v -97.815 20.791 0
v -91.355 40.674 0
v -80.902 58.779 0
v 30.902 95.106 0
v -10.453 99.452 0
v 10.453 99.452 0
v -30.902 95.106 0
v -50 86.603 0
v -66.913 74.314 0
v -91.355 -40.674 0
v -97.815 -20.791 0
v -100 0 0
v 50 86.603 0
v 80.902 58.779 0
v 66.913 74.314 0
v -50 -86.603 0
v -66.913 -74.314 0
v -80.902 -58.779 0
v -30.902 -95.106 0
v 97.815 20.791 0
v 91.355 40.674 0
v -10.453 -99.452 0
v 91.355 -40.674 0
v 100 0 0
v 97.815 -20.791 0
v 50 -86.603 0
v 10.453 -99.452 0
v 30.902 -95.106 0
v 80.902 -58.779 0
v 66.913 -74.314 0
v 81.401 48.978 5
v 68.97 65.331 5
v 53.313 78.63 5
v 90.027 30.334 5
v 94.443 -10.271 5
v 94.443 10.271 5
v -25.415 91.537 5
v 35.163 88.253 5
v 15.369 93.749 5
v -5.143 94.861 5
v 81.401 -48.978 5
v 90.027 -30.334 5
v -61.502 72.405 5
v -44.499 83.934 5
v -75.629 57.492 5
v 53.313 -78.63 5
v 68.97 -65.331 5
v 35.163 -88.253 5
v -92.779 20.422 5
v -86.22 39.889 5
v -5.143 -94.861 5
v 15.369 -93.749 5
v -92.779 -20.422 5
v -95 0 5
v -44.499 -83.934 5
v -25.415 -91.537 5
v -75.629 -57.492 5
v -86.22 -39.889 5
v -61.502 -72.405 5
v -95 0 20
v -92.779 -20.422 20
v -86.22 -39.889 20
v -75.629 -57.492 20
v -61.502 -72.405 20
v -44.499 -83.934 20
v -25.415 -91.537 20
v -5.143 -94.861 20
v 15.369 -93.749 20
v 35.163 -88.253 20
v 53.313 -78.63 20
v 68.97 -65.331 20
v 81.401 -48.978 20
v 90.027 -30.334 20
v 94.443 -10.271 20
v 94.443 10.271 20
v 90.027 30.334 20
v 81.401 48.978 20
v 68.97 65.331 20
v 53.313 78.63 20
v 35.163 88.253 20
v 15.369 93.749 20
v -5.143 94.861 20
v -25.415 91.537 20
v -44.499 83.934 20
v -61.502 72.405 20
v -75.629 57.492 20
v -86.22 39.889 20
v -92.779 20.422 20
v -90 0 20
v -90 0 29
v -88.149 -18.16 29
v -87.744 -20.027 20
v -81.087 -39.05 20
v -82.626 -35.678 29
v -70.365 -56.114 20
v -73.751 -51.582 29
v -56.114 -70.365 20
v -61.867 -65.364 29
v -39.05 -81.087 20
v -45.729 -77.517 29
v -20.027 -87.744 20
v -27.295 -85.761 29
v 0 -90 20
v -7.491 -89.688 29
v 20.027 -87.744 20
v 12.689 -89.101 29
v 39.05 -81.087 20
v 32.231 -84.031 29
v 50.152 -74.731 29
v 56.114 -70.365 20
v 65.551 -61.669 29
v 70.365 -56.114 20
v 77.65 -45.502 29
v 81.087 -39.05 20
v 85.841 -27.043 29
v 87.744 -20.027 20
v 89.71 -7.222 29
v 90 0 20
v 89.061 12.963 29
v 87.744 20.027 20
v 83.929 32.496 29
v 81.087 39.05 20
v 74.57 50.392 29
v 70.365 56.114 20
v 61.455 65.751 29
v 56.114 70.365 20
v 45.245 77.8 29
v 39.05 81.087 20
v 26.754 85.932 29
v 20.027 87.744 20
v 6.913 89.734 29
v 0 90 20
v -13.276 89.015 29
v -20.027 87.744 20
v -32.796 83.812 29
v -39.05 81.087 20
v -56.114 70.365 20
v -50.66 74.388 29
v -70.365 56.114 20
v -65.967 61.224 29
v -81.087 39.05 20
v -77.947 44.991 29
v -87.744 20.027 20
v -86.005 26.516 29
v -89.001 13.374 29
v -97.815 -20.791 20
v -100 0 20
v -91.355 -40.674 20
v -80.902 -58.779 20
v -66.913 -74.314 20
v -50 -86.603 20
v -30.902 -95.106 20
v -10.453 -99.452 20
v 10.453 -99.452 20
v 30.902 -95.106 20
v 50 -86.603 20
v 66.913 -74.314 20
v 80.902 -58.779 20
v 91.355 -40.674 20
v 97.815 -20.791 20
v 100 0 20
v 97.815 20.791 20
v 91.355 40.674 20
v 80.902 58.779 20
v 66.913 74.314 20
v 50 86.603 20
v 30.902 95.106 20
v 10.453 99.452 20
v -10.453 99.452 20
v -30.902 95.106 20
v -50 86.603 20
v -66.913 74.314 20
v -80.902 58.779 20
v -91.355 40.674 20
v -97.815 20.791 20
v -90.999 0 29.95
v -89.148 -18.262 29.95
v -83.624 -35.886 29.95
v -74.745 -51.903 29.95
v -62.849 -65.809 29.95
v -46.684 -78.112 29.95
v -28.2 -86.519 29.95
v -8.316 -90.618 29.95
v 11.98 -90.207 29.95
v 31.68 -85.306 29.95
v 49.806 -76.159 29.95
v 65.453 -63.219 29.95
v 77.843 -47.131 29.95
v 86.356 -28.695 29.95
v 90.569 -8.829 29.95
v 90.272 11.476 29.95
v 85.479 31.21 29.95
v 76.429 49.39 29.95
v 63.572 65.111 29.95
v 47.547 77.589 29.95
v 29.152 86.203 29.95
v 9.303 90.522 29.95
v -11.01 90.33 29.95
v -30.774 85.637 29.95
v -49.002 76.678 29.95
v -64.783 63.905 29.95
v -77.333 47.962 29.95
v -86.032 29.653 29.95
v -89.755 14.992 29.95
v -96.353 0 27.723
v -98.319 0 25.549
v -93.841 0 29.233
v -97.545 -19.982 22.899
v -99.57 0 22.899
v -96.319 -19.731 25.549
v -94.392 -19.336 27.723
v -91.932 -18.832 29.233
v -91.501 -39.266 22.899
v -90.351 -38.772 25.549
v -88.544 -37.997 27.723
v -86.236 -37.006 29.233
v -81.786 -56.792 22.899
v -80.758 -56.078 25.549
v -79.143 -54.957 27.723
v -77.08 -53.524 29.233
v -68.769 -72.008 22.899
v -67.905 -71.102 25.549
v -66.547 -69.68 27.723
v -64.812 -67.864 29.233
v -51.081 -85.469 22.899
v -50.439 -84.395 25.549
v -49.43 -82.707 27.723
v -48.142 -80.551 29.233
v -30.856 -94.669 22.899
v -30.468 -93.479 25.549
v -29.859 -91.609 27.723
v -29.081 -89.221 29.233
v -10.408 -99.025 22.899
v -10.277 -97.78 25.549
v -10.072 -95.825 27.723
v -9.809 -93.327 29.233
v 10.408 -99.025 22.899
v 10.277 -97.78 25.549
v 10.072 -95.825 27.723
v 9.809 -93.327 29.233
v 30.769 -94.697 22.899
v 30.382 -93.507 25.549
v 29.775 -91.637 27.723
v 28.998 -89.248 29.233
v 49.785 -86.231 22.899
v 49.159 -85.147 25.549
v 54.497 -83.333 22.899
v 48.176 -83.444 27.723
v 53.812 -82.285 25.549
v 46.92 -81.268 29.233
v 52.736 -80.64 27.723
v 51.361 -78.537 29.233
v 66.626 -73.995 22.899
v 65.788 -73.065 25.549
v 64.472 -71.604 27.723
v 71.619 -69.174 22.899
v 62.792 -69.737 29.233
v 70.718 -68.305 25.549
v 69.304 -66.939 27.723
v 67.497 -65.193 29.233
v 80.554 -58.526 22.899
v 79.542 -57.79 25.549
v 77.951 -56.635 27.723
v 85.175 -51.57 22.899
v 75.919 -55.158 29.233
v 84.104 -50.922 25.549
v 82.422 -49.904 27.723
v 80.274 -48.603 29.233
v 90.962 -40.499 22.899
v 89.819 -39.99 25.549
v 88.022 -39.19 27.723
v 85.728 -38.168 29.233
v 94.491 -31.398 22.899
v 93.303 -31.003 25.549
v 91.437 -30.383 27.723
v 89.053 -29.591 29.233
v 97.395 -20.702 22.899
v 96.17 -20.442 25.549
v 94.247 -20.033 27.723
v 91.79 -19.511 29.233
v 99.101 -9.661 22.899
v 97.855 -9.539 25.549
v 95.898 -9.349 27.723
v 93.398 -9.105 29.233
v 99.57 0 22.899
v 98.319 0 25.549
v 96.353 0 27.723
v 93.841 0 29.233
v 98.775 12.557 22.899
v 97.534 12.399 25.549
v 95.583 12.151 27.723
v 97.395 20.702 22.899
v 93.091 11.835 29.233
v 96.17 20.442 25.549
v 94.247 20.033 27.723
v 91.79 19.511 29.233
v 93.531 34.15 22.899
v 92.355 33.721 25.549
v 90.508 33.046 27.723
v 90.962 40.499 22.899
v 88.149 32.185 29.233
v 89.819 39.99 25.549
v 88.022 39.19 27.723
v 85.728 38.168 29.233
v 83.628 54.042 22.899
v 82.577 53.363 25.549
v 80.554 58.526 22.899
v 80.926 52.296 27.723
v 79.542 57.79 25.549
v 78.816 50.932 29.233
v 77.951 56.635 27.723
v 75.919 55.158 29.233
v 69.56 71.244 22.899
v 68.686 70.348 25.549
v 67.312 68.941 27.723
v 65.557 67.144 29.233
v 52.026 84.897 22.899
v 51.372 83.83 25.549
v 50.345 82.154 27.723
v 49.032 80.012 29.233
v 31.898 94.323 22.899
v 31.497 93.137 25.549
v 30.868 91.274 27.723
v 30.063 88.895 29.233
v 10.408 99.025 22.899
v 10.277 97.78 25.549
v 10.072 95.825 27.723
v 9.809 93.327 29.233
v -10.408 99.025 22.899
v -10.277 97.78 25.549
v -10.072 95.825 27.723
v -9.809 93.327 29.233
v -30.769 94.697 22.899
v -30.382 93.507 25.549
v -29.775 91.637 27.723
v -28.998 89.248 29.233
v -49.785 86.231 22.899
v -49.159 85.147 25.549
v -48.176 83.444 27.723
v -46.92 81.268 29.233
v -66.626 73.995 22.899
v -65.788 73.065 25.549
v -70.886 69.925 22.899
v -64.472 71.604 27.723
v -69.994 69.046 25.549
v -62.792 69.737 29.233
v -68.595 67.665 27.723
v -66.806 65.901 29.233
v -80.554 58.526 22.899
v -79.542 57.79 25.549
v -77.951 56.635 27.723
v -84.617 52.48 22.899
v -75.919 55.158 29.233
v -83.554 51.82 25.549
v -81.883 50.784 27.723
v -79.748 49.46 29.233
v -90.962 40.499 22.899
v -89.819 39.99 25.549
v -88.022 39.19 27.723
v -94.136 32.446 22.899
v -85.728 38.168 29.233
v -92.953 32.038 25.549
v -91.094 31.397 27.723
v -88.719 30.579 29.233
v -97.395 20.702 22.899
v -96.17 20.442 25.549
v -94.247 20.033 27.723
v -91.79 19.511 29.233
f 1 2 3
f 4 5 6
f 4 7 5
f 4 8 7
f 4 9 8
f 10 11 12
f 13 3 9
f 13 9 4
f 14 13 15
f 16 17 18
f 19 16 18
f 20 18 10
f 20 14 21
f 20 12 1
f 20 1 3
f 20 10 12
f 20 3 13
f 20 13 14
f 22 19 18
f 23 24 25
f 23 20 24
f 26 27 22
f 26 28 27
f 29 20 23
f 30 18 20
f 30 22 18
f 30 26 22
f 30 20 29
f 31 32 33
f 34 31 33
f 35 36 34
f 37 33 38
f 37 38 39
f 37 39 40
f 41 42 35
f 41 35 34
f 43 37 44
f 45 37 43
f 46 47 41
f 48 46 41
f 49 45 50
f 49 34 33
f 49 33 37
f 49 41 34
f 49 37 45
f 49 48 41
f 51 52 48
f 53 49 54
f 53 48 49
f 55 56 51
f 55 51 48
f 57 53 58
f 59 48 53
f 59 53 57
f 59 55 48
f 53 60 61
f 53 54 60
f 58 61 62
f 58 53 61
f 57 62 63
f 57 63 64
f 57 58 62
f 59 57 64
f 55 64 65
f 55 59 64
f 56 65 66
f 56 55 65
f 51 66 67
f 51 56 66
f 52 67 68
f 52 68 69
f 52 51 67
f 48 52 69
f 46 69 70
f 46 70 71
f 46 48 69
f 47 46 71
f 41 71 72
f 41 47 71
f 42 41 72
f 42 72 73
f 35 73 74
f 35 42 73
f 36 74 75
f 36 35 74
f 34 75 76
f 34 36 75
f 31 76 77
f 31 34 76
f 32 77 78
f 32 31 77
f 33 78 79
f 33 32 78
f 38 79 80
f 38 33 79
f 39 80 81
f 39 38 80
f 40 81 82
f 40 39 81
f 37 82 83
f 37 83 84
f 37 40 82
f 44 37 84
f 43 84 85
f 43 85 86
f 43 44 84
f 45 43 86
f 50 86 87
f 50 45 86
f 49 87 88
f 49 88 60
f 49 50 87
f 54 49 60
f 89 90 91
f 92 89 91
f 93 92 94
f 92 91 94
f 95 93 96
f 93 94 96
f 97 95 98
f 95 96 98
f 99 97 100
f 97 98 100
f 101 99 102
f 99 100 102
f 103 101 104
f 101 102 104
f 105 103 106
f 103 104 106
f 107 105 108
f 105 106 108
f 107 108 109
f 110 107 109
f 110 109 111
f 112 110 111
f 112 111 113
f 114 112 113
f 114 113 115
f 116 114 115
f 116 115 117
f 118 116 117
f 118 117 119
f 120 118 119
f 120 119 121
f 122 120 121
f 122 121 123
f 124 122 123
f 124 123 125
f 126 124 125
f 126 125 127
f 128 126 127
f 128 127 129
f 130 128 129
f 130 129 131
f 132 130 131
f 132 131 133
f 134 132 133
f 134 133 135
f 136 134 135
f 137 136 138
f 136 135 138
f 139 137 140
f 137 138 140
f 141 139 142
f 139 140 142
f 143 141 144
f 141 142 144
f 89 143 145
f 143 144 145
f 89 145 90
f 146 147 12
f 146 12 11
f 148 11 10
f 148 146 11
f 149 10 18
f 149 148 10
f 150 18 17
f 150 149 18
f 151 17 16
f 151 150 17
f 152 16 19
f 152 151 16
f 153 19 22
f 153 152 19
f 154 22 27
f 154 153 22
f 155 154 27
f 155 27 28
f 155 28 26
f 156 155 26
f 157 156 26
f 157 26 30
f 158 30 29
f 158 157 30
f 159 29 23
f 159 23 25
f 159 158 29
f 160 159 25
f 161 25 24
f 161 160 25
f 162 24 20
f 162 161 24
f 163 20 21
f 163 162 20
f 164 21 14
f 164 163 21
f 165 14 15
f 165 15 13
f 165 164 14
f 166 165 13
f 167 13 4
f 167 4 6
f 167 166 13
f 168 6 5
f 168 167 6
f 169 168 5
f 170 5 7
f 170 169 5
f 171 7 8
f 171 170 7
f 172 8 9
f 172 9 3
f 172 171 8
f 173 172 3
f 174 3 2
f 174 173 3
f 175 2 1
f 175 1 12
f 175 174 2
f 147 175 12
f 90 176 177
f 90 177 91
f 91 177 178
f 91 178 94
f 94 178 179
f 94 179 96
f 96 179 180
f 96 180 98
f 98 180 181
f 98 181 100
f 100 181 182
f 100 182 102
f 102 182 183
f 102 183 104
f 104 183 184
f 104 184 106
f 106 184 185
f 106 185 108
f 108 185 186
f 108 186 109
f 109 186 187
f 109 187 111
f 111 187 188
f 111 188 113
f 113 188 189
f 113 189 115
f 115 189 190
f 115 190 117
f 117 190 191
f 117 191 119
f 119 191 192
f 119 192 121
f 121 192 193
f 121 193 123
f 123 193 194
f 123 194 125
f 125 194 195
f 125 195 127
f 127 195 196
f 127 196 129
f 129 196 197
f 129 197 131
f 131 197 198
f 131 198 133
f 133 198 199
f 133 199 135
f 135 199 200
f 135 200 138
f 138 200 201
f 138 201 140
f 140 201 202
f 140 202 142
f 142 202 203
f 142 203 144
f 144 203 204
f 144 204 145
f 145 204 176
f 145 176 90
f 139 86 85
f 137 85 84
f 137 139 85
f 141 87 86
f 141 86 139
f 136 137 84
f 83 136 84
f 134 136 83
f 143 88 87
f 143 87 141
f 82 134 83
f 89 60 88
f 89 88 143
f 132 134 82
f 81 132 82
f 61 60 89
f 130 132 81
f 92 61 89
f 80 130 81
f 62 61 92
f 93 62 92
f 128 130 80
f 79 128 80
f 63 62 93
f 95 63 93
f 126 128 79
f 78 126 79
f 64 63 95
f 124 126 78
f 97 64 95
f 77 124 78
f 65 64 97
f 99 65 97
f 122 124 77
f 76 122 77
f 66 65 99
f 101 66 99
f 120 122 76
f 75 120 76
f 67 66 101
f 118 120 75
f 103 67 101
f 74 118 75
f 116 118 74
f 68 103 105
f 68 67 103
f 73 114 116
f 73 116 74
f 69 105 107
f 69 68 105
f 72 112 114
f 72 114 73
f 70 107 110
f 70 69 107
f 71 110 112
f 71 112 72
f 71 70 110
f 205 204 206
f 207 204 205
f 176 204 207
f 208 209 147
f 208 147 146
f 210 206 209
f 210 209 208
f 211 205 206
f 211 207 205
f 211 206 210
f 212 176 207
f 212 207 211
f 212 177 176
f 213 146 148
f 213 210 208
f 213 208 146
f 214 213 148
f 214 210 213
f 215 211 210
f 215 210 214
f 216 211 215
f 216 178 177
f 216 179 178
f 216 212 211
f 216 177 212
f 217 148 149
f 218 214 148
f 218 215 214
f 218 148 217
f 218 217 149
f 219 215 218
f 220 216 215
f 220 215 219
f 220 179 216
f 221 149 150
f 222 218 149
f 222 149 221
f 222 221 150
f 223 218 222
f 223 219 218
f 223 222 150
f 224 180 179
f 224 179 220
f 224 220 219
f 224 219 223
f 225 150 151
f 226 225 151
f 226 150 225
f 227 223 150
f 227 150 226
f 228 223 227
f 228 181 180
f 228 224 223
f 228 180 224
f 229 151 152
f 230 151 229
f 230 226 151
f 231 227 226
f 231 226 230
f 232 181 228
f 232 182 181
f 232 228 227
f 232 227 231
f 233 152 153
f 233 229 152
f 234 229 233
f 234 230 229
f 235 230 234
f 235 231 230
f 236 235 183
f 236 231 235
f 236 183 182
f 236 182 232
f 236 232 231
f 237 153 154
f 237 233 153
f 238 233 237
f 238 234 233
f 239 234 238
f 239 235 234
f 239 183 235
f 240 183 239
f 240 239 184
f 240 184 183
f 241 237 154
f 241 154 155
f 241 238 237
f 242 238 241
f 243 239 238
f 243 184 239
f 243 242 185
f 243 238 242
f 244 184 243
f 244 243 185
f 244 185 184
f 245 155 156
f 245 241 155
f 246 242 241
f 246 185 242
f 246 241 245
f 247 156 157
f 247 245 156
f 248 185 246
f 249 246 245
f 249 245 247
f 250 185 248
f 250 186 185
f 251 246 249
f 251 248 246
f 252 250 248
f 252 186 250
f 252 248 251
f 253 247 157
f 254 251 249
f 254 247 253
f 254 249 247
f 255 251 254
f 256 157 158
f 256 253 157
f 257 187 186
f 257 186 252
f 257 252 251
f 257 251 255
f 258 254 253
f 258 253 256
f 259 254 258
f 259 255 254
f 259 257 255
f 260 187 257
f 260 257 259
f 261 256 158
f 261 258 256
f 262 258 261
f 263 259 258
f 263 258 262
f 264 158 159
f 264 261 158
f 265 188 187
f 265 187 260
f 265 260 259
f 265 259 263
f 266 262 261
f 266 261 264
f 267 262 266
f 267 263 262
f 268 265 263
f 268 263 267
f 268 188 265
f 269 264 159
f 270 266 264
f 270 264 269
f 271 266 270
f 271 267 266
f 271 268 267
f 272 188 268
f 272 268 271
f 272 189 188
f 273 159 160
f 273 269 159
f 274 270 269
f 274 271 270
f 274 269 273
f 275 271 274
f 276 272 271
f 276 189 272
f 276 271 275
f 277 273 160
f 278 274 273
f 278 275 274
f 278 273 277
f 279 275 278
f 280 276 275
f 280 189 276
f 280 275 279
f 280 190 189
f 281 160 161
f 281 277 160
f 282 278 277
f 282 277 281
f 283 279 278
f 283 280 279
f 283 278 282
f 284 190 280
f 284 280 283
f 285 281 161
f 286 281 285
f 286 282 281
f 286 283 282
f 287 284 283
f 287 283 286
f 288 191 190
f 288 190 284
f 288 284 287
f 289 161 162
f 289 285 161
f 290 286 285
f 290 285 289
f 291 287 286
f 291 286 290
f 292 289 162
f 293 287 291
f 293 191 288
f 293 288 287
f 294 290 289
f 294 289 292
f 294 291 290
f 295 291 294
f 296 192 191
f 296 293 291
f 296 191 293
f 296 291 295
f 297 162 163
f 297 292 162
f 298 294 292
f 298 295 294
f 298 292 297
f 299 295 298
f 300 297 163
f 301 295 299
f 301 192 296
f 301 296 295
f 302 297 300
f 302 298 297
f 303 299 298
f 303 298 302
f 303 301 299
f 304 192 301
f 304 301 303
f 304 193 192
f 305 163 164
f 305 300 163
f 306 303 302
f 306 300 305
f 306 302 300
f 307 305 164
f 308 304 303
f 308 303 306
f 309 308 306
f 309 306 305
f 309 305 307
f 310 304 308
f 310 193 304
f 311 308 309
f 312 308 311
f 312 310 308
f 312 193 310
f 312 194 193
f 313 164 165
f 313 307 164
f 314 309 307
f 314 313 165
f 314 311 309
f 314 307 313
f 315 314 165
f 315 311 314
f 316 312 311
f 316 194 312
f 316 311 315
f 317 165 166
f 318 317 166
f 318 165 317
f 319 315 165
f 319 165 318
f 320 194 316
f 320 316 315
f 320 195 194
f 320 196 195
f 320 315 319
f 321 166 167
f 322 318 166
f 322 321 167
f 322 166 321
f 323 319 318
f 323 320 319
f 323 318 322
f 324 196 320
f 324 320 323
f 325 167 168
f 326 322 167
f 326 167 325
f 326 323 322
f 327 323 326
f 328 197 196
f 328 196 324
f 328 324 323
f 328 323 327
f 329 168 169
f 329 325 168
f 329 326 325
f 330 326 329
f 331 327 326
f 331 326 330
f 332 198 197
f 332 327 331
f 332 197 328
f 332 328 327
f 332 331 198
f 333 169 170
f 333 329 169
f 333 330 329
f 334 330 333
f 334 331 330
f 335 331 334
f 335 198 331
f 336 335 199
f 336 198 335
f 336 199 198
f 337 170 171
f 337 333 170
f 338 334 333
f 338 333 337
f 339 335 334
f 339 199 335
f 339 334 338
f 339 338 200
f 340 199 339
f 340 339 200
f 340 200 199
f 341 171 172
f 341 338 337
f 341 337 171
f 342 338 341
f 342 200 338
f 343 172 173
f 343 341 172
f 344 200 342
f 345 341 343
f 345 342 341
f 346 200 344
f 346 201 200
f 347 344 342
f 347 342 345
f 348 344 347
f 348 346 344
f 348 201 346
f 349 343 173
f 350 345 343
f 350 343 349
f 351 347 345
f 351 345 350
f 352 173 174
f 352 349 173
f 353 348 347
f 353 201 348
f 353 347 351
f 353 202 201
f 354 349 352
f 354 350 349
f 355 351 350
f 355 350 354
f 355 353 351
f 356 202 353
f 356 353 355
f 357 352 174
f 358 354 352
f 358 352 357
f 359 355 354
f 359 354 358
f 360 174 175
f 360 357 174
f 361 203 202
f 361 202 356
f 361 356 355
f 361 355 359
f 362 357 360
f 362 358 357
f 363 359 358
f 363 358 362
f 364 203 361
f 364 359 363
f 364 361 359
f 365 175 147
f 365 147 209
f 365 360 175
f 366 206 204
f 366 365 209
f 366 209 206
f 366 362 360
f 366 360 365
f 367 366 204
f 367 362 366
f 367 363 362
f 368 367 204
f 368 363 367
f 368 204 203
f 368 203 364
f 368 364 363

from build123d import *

# Parameters (mm, degrees)
FILLET_R     = 10
SKETCH001_R  = 90
POCKET_DEPTH = 25
CHAMFER_SIZE = 1


with BuildPart() as part:
    # Sketch → Revolution (revolve)
    with BuildSketch(Plane.XZ):
        Polygon((0, 0), (-100, 0), (-100, 30), (0, 30), (0, 20), (-95, 20), (-95, 5), (0, 5), align=None)
    revolve(axis=Axis((0, 0, 0), (0, 0, 1)))

    # Fillet
    fillet_edges = [part.edges().sort_by_distance(p)[0] for p in [
        (100, 0, 30),
    ]]
    fillet(fillet_edges, radius=FILLET_R)

    # Sketch001 → Pocket (cut)
    with BuildSketch(Plane(origin=(0, 0, 30), x_dir=(-1, 0, 0), z_dir=(0, 0, 1))):
        Circle(SKETCH001_R)
    extrude(amount=-POCKET_DEPTH, mode=Mode.SUBTRACT)

    # Chamfer
    chamfer_edges = [part.edges().sort_by_distance(p)[0] for p in [
        (90, 0, 30),
    ]]
    chamfer(chamfer_edges, length=CHAMFER_SIZE)


solid = part.part
